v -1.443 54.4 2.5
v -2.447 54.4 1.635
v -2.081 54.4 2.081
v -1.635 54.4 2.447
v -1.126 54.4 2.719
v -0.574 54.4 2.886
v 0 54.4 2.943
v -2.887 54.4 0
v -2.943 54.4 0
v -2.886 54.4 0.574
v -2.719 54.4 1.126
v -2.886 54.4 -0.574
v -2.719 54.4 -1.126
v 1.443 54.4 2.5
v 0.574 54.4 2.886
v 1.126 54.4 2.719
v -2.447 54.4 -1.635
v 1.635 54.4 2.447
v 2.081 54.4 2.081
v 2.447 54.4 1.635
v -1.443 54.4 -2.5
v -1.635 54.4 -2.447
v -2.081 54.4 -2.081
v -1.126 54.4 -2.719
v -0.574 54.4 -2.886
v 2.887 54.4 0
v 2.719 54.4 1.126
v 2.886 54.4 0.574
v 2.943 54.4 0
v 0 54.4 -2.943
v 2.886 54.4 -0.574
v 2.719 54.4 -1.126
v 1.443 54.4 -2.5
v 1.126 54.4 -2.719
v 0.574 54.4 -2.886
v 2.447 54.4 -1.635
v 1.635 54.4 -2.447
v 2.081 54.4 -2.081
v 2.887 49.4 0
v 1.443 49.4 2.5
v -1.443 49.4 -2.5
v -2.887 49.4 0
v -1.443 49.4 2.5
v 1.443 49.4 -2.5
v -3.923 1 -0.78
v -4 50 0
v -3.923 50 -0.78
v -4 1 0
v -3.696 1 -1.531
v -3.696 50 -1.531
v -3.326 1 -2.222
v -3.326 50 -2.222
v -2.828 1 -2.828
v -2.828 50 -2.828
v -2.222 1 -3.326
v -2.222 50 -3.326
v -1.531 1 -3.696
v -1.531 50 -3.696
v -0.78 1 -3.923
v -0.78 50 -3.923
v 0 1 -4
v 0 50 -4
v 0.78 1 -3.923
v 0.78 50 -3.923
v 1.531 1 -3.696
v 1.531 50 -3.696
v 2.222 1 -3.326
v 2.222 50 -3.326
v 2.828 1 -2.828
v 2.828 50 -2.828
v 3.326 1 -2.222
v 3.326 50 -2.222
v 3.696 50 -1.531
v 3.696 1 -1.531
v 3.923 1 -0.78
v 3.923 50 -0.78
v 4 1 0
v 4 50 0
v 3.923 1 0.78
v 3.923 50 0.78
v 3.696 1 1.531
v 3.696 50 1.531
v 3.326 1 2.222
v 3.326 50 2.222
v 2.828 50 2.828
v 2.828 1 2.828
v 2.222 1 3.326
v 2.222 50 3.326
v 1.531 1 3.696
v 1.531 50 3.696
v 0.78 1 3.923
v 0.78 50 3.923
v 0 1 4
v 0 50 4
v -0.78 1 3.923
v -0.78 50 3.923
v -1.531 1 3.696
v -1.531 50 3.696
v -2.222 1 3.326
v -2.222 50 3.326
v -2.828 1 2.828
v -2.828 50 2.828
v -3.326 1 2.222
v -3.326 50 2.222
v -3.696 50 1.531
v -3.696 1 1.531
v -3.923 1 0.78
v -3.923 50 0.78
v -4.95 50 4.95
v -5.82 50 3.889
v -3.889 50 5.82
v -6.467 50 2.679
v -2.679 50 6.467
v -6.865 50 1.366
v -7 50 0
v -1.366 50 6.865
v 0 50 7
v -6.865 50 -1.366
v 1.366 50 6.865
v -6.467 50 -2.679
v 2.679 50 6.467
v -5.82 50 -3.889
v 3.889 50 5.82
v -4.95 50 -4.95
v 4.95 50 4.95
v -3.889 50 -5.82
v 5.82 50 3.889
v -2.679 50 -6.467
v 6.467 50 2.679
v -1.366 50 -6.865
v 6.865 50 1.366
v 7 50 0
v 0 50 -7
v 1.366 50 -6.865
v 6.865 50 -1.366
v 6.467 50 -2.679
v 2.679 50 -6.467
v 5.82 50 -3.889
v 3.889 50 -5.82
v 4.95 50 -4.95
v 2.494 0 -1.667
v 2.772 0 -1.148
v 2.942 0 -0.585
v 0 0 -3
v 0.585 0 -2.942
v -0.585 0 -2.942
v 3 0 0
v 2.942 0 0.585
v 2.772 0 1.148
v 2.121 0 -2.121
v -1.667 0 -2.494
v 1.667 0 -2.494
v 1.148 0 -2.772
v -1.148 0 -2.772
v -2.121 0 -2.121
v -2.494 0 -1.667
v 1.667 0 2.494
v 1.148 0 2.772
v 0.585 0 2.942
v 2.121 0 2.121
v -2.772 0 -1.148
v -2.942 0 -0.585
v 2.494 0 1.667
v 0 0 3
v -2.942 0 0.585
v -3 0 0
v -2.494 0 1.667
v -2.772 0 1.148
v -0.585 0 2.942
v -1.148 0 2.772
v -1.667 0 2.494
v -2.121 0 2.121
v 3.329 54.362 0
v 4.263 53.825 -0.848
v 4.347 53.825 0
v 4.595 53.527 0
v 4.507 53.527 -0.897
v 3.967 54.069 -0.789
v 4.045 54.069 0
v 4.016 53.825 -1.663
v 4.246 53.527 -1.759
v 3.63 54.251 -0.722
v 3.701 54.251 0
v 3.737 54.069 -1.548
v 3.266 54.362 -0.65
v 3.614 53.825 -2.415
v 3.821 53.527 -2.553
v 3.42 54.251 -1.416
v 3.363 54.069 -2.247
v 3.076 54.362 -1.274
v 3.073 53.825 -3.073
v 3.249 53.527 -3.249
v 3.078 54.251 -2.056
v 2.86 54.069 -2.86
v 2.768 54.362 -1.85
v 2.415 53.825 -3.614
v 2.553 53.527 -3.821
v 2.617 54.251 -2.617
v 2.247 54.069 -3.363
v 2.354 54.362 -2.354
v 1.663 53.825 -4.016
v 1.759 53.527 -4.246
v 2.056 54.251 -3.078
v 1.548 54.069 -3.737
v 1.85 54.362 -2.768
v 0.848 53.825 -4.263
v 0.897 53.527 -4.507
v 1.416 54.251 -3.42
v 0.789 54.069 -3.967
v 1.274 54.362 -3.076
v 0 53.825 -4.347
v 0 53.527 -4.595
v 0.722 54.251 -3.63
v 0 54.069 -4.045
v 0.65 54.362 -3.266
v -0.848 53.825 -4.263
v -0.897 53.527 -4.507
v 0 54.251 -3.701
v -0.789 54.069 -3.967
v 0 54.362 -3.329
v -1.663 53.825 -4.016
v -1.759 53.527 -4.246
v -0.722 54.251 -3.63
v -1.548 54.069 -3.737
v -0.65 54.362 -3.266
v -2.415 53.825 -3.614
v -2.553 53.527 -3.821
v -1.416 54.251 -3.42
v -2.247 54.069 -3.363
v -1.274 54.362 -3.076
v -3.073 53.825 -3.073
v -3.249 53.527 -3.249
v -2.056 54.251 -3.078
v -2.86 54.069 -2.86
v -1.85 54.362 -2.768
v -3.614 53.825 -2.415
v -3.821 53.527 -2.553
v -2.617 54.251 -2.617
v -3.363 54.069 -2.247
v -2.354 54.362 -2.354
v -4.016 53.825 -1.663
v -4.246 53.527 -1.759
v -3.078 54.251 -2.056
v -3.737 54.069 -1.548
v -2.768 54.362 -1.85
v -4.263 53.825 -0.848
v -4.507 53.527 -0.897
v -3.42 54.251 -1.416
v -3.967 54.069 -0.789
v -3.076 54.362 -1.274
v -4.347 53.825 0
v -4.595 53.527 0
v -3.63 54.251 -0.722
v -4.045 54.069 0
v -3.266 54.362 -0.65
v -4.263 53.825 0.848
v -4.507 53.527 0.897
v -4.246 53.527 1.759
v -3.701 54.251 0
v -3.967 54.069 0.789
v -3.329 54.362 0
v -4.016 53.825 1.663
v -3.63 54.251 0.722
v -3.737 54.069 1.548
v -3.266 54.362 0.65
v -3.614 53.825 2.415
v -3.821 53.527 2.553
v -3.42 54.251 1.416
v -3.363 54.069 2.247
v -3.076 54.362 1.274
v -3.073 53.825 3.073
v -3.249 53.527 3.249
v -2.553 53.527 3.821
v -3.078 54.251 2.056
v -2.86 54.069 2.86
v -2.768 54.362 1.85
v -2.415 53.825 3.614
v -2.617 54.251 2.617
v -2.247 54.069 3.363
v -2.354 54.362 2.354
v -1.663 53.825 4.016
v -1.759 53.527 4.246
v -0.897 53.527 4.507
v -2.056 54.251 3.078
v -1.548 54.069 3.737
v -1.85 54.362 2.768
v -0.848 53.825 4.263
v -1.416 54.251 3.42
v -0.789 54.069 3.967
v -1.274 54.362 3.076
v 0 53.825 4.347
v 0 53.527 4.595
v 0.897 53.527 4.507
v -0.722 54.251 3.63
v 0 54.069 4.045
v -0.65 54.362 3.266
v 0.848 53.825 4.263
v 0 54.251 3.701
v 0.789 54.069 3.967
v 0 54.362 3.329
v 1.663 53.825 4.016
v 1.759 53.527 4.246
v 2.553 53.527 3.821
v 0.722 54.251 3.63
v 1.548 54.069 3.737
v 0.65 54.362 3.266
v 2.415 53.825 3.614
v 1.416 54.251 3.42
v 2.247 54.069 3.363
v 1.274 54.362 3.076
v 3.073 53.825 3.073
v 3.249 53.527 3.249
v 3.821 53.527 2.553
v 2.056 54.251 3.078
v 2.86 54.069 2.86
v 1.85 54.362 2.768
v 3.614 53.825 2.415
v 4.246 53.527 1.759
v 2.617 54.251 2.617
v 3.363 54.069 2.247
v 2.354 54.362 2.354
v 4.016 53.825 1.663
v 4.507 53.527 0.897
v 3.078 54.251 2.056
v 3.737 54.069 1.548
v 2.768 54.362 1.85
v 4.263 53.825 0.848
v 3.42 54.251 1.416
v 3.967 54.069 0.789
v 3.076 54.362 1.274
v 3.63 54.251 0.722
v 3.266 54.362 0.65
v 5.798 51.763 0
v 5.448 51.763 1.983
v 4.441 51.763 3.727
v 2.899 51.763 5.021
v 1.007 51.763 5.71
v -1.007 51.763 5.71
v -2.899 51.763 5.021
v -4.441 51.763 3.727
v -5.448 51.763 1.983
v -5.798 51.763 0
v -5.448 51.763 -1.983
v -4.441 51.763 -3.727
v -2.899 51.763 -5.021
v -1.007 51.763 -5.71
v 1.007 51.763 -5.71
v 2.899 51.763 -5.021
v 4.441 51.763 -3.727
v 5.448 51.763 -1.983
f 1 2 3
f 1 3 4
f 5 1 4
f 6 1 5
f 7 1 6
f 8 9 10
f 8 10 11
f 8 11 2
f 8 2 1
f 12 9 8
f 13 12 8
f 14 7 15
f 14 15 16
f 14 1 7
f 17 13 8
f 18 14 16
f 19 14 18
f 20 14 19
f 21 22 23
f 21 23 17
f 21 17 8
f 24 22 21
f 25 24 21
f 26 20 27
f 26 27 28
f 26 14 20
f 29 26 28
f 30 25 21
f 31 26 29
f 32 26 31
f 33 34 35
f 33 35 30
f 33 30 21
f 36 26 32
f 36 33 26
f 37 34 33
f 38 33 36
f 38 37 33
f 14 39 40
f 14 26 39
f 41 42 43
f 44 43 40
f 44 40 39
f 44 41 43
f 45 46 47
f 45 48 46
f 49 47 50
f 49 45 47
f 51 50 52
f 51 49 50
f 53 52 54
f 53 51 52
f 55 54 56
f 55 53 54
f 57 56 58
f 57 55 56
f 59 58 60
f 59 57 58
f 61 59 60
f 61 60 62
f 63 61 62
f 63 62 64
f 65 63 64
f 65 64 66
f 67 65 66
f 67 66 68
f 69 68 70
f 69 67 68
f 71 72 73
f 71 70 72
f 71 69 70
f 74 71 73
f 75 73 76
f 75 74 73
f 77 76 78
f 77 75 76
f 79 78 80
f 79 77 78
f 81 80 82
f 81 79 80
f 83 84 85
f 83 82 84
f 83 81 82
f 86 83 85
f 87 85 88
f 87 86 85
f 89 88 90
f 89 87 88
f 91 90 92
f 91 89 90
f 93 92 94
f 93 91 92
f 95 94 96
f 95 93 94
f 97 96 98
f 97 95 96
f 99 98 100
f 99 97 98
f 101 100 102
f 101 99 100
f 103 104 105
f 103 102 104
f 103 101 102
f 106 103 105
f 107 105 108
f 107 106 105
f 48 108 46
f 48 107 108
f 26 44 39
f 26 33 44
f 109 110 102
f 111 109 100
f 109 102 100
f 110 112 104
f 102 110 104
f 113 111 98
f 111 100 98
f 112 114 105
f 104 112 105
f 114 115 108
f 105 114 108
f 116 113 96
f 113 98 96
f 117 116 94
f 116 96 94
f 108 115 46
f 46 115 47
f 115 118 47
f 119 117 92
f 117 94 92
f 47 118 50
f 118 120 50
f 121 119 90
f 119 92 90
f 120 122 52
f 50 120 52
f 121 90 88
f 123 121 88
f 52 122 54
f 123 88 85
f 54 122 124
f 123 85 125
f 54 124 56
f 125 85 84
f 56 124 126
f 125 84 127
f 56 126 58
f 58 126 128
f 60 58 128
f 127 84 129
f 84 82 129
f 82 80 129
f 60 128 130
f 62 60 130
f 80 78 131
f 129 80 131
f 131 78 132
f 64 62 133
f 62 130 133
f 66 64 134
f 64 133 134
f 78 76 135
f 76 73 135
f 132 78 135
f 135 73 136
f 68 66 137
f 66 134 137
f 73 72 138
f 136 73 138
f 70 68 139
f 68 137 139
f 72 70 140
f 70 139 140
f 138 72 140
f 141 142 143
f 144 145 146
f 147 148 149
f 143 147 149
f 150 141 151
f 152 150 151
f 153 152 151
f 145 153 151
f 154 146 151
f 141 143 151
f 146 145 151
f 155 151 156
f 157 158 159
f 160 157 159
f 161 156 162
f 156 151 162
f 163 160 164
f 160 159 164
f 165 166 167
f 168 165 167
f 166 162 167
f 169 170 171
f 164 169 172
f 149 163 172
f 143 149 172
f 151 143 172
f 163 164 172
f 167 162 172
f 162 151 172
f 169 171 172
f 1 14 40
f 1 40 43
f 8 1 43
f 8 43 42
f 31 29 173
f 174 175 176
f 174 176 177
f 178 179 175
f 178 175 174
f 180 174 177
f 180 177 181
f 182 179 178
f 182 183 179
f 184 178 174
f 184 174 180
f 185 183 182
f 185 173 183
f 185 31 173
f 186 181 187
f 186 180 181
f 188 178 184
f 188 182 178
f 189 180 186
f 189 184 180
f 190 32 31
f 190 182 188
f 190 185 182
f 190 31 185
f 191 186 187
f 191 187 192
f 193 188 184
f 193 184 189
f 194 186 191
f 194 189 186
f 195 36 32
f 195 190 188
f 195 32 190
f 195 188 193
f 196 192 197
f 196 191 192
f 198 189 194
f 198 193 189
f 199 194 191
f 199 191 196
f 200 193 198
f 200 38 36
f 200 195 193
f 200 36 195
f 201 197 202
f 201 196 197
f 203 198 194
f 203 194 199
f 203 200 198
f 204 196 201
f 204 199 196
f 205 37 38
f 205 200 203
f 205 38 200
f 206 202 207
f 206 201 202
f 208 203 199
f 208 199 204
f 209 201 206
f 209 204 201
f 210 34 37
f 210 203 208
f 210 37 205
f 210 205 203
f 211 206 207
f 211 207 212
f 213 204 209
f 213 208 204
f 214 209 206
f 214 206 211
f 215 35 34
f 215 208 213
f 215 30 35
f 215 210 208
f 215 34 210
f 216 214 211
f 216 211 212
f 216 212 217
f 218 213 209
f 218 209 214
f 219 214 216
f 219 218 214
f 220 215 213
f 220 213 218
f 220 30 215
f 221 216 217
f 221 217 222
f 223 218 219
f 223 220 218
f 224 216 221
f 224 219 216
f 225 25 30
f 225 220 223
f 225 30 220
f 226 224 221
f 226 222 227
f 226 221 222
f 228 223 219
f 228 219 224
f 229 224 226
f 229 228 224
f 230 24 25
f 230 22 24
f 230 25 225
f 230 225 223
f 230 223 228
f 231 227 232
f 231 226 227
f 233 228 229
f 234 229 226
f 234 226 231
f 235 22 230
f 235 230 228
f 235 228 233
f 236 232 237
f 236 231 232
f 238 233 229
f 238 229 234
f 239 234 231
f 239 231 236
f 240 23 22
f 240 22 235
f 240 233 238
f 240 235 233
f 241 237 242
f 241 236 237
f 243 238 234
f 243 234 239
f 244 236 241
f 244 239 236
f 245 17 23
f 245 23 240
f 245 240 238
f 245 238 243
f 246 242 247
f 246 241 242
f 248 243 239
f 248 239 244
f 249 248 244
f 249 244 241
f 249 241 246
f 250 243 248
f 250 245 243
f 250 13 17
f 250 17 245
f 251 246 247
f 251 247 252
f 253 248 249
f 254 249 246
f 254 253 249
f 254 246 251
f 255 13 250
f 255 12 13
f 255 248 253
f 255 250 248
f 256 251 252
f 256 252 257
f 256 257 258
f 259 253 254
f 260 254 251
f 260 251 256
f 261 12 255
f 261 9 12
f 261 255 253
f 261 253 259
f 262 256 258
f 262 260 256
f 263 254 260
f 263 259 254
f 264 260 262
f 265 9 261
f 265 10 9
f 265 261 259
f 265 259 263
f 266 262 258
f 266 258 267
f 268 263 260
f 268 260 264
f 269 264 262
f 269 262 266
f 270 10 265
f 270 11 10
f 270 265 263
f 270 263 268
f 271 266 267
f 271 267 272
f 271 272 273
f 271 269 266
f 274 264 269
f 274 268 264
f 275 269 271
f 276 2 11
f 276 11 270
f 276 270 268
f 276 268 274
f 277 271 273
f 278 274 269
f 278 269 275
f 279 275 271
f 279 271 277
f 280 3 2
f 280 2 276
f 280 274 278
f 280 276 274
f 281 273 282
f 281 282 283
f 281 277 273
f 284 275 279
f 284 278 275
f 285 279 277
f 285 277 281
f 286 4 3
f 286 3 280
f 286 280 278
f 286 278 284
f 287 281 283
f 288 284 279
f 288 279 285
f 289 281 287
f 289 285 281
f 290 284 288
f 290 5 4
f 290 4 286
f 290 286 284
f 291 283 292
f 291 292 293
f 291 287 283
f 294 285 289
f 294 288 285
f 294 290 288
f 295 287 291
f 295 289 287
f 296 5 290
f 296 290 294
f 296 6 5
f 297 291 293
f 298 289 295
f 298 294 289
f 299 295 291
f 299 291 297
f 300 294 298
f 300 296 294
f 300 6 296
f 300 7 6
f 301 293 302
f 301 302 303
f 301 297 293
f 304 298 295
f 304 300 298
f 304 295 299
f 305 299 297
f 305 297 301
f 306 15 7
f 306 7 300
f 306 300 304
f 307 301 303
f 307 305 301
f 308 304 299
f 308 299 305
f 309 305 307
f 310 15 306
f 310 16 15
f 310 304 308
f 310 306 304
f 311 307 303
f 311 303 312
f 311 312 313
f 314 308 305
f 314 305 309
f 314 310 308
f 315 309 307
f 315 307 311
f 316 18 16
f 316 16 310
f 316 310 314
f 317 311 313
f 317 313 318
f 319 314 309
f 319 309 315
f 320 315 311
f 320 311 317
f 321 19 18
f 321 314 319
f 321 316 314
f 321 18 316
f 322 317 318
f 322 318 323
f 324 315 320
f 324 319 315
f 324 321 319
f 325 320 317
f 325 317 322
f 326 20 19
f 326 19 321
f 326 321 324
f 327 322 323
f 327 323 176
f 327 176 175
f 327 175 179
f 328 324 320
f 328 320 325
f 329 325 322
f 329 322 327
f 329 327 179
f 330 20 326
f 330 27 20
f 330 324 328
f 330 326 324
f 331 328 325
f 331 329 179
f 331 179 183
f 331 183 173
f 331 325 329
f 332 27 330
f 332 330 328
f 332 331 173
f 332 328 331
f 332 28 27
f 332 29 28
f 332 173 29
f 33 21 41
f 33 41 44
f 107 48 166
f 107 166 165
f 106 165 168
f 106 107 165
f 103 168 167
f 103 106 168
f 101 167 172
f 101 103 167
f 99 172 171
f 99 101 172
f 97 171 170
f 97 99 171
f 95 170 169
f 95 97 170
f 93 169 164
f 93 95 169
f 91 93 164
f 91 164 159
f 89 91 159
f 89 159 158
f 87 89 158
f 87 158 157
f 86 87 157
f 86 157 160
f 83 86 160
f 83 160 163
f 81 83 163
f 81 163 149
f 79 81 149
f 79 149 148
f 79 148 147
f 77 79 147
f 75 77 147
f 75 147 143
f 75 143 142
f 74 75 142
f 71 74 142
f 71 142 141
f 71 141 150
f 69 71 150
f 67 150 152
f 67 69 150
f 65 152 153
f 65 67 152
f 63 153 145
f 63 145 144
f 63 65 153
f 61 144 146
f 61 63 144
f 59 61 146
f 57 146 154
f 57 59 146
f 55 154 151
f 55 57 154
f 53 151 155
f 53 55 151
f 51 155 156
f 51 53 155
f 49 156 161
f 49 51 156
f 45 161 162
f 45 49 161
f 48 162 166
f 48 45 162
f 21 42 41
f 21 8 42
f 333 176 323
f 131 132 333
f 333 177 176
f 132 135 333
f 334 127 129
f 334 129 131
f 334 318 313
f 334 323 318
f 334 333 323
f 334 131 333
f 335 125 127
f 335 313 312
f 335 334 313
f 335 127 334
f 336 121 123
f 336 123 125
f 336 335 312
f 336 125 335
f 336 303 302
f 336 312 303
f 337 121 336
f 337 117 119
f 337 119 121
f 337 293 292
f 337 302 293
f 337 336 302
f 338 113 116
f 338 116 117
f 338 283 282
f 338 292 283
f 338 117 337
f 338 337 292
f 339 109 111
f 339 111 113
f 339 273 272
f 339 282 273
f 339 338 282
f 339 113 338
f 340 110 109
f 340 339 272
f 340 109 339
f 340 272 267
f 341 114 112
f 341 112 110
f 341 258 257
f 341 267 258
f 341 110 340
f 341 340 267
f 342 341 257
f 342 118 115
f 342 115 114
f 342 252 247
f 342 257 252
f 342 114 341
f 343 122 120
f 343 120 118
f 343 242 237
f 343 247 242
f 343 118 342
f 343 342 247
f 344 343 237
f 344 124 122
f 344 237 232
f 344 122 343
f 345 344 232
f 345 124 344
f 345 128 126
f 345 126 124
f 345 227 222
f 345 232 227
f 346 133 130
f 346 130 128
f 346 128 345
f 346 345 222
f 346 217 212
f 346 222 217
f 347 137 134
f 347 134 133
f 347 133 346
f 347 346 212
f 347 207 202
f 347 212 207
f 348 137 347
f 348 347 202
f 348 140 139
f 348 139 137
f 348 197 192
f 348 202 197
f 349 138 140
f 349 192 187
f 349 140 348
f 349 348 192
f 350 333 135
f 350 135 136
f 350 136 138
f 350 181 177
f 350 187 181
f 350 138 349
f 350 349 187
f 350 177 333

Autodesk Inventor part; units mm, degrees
ref_plane "YZ Plane" through (0, 0, 0) normal (1, 0, 0) x (0, 1, 0)
ref_plane "XZ Plane" through (0, 0, 0) normal (0, 1, 0) x (-1, 0, 0)
sketch "Sketch1" plane through (0, 0, 0) normal (0, 1, 0) x (-1, 0, 0)
  circle A0 centre (0, 0) radius 4
  dimension "d0" = 8
extrude "Extrusion1" add sketch "Sketch1" along normal blind 50
chamfer "Chamfer1" distance 1 angle 45 1 edges at (4, 0, 0)
ref_plane "Work Plane1" through (0, 54.4, 0) normal (0, 1, 0) x (1, 0, 0)
thread "Thread1" size "M8x1.25" class "6g" standard "ANSI Metric M Profile" full length
sketch "Sketch5" plane through (0, 50, 0) normal (0, 1, 0) x (1, 0, 0)
  circle A0 centre (0, 0) radius 7
  dimension "d17" = 14
sketch "Sketch6" plane through (0, 54.4, 0) normal (0, 1, 0) x (1, 0, 0)
  circle A0 centre (0, 0) radius 4
  dimension "d18" = 8
loft "Loft2" add profiles "Sketch5", "Sketch6"
fillet "Fillet1" radius 2 1 edges at (-4, 54.4, 0)
sketch "Sketch7" plane through (0, 54.4, 0) normal (0, 1, 0) x (1, 0, 0)
  line L0 (2.8868, 0) -> (1.4434, -2.5)
  line L1 (1.4434, -2.5) -> (-1.4434, -2.5)
  line L2 (-1.4434, -2.5) -> (-2.8868, 0)
  line L3 (-2.8868, 0) -> (-1.4434, 2.5)
  line L4 (-1.4434, 2.5) -> (1.4434, 2.5)
  line L5 (1.4434, 2.5) -> (2.8868, 0)
  point P0 (0, 0)
  point P1 (0, 0)
  dimension "d24" = 5
extrude "Extrusion3" cut sketch "Sketch7" against normal blind 5
properties part number "M8x50"
